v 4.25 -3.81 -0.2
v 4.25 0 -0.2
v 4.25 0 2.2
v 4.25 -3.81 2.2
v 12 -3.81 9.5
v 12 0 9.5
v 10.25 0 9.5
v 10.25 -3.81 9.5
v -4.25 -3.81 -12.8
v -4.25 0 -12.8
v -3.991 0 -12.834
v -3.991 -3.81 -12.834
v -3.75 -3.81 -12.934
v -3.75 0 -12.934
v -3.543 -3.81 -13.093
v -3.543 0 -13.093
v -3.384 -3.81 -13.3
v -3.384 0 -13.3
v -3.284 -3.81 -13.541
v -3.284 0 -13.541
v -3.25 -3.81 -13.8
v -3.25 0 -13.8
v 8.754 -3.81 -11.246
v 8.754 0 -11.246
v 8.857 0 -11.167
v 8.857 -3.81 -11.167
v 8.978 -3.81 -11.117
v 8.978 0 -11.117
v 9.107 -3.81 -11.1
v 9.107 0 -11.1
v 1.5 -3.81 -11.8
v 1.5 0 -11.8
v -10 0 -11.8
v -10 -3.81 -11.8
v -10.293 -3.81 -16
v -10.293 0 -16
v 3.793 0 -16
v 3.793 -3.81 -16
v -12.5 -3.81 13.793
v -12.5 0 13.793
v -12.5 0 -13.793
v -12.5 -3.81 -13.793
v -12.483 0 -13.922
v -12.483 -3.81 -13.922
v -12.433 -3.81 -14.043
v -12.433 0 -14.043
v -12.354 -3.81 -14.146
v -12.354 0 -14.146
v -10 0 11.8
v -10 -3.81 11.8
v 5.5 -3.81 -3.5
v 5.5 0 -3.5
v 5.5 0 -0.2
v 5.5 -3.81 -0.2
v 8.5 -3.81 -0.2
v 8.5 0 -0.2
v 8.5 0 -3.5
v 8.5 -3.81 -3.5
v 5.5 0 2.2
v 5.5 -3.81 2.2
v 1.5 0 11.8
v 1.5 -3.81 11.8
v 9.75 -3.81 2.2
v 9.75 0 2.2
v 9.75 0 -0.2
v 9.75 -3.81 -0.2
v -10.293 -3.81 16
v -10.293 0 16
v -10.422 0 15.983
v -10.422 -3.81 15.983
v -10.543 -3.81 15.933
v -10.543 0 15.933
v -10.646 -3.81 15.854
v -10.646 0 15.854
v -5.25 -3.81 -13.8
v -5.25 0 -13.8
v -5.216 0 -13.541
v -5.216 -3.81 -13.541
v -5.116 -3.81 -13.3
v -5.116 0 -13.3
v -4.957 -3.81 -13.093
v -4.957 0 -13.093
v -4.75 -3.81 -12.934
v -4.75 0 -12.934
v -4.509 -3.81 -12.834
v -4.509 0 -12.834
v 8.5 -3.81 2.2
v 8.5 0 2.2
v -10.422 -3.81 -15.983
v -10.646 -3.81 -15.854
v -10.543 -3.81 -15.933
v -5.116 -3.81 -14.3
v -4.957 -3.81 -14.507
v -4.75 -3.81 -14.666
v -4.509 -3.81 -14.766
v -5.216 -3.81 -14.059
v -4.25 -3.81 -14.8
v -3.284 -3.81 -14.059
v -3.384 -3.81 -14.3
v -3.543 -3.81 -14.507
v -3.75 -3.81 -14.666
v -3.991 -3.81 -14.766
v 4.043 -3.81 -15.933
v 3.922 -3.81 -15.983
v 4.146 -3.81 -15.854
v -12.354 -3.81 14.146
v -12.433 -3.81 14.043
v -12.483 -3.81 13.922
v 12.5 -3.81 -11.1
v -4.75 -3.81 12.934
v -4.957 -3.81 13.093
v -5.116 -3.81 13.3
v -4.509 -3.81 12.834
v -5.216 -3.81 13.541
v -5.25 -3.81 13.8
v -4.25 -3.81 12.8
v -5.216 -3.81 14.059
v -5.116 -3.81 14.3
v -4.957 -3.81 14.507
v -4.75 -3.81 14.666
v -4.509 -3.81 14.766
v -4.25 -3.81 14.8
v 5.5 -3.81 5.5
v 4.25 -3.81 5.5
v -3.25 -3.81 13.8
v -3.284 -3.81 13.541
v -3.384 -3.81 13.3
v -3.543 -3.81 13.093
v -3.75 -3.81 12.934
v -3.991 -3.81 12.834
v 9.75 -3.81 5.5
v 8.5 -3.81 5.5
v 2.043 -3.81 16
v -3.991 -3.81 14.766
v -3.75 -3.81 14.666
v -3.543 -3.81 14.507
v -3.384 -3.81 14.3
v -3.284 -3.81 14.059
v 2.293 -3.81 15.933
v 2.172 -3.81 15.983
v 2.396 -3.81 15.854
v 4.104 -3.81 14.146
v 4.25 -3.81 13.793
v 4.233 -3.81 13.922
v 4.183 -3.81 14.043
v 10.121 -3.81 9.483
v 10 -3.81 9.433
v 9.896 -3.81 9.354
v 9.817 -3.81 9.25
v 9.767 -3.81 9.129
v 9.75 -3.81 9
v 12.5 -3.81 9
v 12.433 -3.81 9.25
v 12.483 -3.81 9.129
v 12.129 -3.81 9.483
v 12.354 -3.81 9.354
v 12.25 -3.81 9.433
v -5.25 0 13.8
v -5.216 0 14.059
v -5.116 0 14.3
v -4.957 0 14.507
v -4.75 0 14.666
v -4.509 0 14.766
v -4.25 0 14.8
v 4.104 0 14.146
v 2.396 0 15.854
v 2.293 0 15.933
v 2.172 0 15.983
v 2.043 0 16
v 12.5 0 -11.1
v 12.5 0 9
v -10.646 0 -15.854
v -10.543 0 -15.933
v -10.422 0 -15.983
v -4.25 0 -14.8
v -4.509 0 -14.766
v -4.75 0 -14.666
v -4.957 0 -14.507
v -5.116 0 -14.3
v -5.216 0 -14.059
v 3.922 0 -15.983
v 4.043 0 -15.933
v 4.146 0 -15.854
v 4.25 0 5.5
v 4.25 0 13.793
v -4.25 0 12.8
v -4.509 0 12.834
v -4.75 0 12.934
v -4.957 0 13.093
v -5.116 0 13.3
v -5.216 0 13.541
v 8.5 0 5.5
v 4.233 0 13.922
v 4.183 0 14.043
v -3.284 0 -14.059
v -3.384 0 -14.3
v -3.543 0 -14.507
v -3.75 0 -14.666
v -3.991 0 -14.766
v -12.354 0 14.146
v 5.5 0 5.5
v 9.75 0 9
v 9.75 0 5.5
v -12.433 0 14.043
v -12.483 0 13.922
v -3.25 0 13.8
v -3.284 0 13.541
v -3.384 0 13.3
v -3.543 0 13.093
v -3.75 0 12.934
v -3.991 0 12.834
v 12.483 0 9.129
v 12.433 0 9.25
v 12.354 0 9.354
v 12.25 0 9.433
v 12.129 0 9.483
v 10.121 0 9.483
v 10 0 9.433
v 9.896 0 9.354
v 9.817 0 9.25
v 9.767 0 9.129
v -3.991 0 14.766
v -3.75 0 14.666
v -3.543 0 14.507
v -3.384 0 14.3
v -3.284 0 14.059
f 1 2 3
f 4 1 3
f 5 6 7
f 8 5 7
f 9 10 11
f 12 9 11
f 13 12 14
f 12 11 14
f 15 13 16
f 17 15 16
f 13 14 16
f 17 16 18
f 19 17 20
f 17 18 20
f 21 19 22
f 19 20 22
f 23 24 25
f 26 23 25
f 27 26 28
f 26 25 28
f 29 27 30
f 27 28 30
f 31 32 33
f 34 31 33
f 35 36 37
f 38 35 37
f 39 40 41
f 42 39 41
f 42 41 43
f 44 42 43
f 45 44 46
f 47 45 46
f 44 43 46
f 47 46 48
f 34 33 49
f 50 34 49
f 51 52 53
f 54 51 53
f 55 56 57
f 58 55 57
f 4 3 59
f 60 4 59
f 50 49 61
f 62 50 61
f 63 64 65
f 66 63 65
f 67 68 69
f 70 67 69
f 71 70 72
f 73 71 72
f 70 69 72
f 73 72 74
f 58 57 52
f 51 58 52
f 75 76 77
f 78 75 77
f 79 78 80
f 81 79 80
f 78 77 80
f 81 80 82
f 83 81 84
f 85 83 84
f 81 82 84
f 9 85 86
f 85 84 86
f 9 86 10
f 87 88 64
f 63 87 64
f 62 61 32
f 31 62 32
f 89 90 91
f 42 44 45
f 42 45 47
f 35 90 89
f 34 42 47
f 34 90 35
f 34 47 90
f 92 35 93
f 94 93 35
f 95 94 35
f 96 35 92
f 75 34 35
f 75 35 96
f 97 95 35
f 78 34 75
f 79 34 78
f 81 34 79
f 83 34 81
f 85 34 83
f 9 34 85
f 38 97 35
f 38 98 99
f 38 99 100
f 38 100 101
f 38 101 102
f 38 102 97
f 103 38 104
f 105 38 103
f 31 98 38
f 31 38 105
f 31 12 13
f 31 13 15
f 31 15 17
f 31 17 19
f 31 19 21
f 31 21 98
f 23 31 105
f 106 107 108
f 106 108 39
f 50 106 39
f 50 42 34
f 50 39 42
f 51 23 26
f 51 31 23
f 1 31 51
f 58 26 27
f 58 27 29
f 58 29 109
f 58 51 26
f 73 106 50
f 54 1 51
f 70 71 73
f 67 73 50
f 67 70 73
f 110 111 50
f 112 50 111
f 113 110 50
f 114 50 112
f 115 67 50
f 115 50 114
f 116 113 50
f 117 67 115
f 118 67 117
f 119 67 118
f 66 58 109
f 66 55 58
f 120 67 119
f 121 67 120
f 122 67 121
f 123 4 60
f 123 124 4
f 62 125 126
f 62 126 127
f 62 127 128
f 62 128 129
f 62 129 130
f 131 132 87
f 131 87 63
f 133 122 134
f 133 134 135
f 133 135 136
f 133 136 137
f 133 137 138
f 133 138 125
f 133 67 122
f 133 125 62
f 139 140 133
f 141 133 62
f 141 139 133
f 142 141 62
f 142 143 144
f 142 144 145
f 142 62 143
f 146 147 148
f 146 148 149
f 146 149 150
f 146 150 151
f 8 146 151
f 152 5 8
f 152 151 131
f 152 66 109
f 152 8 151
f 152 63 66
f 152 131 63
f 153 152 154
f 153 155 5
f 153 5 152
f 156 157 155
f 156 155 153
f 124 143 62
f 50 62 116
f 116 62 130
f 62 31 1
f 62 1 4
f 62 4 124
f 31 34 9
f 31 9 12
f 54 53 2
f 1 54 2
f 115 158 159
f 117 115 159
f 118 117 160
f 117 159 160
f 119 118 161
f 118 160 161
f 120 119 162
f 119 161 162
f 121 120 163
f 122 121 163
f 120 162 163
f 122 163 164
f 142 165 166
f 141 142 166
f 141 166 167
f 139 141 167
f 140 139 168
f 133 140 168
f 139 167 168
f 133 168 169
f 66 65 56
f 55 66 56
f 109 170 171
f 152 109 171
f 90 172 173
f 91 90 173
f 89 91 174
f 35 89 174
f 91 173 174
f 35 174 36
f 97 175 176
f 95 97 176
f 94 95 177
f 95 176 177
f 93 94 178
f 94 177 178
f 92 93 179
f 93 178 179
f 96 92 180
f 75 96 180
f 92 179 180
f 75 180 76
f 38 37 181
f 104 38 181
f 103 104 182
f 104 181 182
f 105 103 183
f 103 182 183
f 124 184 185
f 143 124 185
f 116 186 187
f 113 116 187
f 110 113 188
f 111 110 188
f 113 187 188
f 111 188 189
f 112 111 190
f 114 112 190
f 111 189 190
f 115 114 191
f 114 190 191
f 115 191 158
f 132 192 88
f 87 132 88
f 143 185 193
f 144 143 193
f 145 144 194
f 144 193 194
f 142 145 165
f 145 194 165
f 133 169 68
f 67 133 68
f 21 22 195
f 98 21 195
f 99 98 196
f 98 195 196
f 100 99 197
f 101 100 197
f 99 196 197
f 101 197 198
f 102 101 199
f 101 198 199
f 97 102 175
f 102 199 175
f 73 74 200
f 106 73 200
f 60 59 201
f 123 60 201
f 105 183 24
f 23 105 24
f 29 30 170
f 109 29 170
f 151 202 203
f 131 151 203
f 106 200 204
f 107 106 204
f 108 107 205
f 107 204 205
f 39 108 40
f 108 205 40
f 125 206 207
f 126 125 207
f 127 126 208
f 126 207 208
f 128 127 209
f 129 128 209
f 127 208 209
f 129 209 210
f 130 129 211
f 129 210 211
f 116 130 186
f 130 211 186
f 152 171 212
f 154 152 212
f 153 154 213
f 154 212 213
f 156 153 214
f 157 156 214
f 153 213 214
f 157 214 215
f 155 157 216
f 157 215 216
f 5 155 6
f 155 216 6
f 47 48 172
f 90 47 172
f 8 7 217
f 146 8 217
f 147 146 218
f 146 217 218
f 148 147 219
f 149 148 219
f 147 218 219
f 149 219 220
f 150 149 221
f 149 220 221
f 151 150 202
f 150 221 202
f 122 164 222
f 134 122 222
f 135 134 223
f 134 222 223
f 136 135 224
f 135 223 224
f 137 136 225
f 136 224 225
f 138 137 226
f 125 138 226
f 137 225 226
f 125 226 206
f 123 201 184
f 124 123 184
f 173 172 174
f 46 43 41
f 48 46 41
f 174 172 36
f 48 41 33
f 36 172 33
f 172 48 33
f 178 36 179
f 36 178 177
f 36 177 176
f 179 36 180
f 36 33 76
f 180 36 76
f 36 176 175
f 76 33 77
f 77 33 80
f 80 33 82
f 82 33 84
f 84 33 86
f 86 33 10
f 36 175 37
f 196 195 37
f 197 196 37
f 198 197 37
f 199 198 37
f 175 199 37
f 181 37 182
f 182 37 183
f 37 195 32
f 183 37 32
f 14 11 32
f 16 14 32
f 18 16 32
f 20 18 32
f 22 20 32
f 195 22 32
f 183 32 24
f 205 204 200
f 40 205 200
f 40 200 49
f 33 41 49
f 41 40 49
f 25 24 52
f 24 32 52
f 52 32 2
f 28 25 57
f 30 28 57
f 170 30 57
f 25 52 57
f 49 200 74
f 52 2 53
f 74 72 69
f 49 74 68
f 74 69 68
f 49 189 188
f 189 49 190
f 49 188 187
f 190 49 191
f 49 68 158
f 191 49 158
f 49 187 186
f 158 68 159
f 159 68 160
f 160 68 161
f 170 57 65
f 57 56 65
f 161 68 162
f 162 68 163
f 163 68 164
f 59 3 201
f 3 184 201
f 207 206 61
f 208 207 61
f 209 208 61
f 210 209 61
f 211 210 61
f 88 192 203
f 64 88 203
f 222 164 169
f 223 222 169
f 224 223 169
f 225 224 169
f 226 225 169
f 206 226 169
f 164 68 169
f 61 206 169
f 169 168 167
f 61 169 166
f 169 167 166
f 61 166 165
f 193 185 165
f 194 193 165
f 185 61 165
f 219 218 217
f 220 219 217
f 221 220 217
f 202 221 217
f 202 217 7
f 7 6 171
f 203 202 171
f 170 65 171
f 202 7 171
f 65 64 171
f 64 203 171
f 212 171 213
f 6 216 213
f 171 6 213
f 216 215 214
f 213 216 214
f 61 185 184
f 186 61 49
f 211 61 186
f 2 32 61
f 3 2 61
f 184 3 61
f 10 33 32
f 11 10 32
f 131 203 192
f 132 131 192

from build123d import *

# Parameters (mm, degrees)
F1_DEPTH = 3.81


# Not quite as in the source:
# - ends of sketch curves that miss each other by under 0.0002 mm in the source are joined


with BuildPart() as f1:
    # F0 (on Front) → F1 (new body)
    with BuildSketch(Plane.XZ):
        with BuildLine():
            Line((-10.292893, -16), (-4.25, -16))
            Line((-4.25, -16), (-4.25, -14.8))
            ThreePointArc((-4.25, -14.8), (-4.9571067812, -14.5071067812), (-5.25, -13.8))
            ThreePointArc((-5.25, -13.8), (-4.9571067812, -13.0928932188), (-4.25, -12.8))
            Line((-4.25, -12.8), (-4.25, -11.8))
            Line((-4.25, -11.8), (-10, -11.8))
            Line((-10, -11.8), (-10, 11.8))
            Line((-10, 11.8), (-4.25, 11.8))
            Line((-4.25, 11.8), (-4.25, 12.8))
            ThreePointArc((-4.25, 12.8), (-4.9571067812, 13.0928932188), (-5.25, 13.8))
            ThreePointArc((-5.25, 13.8), (-4.9571067812, 14.5071067812), (-4.25, 14.8))
            Line((-4.25, 14.8), (-4.25, 16))
            Line((-4.25, 16), (-10.292893, 16))
            ThreePointArc((-10.292893, 16), (-10.4842347162, 15.9619397663), (-10.6464463906, 15.8535533906))
            Line((-10.6464463906, 15.8535533906), (-12.353554, 14.146447))
            ThreePointArc((-12.353554, 14.146447), (-12.4619399016, 13.9842353895), (-12.5, 13.792894))
            Line((-12.5, 13.792894), (-12.5, -13.792893))
            ThreePointArc((-12.5, -13.792893), (-12.4619399016, -13.9842343895), (-12.3535538906, -14.1464458906))
            Line((-12.3535538906, -14.1464458906), (-10.646447, -15.853553))
            ThreePointArc((-10.646447, -15.853553), (-10.4842350428, -15.961939631), (-10.292893, -16))
        make_face()
        with BuildLine():
            Line((12.5, -11.1), (12.5, 9))
            ThreePointArc((12.5, 9), (12.3535533906, 9.3535533906), (12, 9.5))
            Line((12, 9.5), (10.25, 9.5))
            ThreePointArc((10.25, 9.5), (9.8964466094, 9.3535533906), (9.75, 9))
            Line((9.75, 9), (9.75, 5.5))
            Line((9.75, 5.5), (8.5, 5.5))
            Line((8.5, 5.5), (8.5, 2.2))
            Line((8.5, 2.2), (9.75, 2.2))
            Line((9.75, 2.2), (9.75, -0.2))
            Line((9.75, -0.2), (8.5, -0.2))
            Line((8.5, -0.2), (8.5, -3.5))
            Line((8.5, -3.5), (5.5, -3.5))
            Line((5.5, -3.5), (5.5, -0.2))
            Line((5.5, -0.2), (4.25, -0.2))
            Line((4.25, -0.2), (4.25, 2.2))
            Line((4.25, 2.2), (5.5, 2.2))
            Line((5.5, 2.2), (5.5, 5.5))
            Line((5.5, 5.5), (4.25, 5.5))
            Line((4.25, 5.5), (4.25, 13.792894))
            ThreePointArc((4.25, 13.792894), (4.2119397663, 13.9842357162), (4.1035533906, 14.1464473906))
            Line((4.1035533906, 14.1464473906), (2.396446, 15.853554))
            ThreePointArc((2.396446, 15.853554), (2.2342343895, 15.9619399016), (2.042893, 16))
            Line((2.042893, 16), (-4.25, 16))
            Line((-4.25, 16), (-4.25, 14.8))
            ThreePointArc((-4.25, 14.8), (-3.5428932188, 14.5071067812), (-3.25, 13.8))
            ThreePointArc((-3.25, 13.8), (-3.5428932188, 13.0928932188), (-4.25, 12.8))
            Line((-4.25, 12.8), (-4.25, 11.8))
            Line((-4.25, 11.8), (1.5, 11.8))
            Line((1.5, 11.8), (1.5, -11.8))
            Line((1.5, -11.8), (-4.25, -11.8))
            Line((-4.25, -11.8), (-4.25, -12.8))
            ThreePointArc((-4.25, -12.8), (-3.5428932188, -13.0928932188), (-3.25, -13.8))
            ThreePointArc((-3.25, -13.8), (-3.5428932188, -14.5071067812), (-4.25, -14.8))
            Line((-4.25, -14.8), (-4.25, -16))
            Line((-4.25, -16), (3.792893, -16))
            ThreePointArc((3.792893, -16), (3.9842347162, -15.9619397663), (4.1464463906, -15.8535533906))
            Line((4.1464463906, -15.8535533906), (8.753553, -11.246446))
            ThreePointArc((8.753553, -11.246446), (8.9157652838, -11.1380602337), (9.107107, -11.1))
            Line((9.107107, -11.1), (12.5, -11.1))
        make_face()
    extrude(amount=F1_DEPTH)


solid = f1.part
